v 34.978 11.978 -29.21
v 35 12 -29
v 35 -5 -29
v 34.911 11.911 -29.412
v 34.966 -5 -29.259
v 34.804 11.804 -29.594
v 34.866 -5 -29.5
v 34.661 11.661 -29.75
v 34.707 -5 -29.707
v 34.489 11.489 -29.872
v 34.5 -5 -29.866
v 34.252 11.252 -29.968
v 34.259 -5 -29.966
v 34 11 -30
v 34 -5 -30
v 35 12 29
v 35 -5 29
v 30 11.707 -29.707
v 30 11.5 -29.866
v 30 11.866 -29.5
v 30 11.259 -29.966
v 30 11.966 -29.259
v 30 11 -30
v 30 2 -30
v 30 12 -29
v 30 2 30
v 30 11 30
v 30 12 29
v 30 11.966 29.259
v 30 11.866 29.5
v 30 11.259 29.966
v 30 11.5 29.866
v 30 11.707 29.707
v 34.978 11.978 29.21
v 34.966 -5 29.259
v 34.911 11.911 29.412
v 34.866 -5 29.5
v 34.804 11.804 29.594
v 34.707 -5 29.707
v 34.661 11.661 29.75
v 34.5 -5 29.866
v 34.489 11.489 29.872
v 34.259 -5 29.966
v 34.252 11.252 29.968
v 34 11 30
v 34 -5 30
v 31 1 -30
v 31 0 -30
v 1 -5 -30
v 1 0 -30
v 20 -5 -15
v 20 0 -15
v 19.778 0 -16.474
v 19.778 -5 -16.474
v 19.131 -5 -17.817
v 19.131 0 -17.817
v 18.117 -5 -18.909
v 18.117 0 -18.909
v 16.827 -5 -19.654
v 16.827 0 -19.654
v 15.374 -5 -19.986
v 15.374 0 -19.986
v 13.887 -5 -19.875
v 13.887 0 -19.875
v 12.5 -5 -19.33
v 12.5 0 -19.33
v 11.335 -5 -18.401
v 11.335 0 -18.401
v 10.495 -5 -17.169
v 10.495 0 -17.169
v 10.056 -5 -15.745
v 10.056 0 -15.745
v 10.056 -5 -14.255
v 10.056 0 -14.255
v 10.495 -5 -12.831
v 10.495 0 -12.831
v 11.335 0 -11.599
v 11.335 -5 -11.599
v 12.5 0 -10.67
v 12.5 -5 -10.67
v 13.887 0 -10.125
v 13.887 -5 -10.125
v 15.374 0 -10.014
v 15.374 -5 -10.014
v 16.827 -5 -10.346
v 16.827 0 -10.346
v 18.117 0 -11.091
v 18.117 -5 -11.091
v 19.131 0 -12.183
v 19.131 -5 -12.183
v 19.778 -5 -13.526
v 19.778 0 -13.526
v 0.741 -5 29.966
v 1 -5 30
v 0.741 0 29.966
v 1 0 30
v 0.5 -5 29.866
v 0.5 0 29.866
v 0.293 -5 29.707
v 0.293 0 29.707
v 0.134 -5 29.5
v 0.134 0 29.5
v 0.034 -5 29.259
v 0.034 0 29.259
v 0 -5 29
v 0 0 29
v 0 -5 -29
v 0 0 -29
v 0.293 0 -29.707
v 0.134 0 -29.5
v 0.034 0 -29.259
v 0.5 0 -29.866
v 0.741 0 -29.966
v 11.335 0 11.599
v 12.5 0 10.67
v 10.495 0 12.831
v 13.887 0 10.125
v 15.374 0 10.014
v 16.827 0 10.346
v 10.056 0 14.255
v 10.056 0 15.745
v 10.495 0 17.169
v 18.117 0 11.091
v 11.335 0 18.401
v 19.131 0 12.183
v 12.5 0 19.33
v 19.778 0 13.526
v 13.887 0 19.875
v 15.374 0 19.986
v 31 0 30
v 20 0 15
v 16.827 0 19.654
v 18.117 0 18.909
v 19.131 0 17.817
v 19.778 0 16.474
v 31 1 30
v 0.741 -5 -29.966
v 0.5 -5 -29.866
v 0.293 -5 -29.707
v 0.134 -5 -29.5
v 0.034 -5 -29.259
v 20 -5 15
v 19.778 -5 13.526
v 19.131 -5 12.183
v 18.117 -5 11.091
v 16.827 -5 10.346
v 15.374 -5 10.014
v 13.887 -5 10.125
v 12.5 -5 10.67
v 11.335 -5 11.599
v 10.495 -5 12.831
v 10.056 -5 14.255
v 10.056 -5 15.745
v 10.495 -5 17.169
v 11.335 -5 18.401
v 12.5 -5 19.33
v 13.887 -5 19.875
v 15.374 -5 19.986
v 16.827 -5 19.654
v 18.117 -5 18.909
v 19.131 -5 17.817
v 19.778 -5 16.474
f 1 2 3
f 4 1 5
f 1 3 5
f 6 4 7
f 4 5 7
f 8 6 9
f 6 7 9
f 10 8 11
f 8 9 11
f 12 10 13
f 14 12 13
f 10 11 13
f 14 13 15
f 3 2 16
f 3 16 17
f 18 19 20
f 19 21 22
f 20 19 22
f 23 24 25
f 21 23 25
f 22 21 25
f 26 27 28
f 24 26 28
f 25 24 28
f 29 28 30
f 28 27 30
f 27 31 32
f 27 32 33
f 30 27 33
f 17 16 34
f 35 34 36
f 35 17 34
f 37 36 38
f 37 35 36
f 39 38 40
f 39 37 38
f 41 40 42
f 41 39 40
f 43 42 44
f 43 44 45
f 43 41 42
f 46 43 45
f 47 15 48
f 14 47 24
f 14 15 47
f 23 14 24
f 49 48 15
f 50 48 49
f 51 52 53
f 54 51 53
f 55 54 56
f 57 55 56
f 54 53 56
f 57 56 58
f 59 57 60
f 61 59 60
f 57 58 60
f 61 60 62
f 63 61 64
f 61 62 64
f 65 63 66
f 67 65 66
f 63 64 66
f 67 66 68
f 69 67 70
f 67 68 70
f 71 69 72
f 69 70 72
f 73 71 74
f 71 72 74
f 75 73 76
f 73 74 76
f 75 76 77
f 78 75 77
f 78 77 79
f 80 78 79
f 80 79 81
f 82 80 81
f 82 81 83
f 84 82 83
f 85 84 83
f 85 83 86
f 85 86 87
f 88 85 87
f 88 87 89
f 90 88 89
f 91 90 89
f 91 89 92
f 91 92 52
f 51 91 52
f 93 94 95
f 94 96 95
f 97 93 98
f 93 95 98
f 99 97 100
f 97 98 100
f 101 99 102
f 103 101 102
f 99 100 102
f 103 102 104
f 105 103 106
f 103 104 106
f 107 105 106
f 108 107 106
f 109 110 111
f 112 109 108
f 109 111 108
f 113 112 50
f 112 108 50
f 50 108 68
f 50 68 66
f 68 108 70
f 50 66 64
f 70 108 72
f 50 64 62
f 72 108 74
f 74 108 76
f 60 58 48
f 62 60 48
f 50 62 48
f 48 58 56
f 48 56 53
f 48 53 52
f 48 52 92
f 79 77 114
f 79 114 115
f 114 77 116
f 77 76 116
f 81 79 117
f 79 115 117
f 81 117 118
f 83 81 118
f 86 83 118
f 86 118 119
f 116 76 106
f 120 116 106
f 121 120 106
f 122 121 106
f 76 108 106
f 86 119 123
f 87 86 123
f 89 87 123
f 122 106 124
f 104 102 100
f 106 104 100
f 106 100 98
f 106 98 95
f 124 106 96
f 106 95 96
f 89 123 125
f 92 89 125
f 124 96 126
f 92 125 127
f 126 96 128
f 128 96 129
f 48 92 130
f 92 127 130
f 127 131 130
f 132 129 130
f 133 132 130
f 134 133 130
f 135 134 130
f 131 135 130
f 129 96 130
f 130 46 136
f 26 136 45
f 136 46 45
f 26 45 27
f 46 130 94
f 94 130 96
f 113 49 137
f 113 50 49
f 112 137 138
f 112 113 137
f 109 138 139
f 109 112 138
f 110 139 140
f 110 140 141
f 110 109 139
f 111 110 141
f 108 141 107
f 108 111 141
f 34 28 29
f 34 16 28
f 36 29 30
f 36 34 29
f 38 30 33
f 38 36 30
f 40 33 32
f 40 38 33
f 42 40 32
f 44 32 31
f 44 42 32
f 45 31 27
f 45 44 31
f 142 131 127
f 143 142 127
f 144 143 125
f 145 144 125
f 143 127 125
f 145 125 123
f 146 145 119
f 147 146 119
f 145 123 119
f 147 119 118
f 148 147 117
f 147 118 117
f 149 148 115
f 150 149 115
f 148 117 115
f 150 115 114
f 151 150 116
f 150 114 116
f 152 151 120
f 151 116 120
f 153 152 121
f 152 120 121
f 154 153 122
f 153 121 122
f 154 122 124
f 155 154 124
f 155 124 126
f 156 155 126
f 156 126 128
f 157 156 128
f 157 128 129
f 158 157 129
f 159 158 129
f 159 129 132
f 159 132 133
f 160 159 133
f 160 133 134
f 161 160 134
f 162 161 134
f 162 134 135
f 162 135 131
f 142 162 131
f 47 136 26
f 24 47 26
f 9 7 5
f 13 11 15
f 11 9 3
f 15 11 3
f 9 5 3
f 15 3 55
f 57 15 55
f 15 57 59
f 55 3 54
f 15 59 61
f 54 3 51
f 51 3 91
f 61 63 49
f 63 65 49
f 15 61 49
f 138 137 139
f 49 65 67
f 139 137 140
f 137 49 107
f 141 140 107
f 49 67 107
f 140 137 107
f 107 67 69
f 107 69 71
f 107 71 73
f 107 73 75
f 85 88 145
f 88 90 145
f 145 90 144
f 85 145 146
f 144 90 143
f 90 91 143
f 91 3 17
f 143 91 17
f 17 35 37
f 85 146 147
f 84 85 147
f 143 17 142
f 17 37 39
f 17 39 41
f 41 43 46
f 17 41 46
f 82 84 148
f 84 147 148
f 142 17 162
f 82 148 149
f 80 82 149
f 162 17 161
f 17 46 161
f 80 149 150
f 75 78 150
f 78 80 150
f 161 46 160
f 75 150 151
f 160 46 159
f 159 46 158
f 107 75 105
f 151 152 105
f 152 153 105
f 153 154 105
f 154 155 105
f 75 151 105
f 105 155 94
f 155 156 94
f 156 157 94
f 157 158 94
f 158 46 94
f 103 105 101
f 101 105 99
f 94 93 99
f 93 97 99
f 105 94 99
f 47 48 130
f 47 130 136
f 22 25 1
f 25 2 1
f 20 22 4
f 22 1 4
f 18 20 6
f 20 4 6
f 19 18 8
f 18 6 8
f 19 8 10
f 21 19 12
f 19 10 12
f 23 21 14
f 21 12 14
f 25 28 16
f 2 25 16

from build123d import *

# Parameters (mm, degrees)
EXTRUDE_THIN1_DEPTH  = 30
M8_CLEARANCE_HOLE1_D = 10
CUT_EXTRUDE1_REACH   = 72.491
FILLET1_R            = 1


with BuildPart() as part:
    # Sketch1 → Extrude-Thin1 (new, symmetric)
    with BuildSketch(Plane.XY):
        Polygon((0, 0), (30, 0), (30, 12), (35, 12), (35, -5), (0, -5), align=None)
    extrude(amount=EXTRUDE_THIN1_DEPTH, both=True)

    # M8 Clearance Hole1 (through all)
    with Locations(Plane(origin=(0, -5, 0), x_dir=(-1, 0, 0), z_dir=(0, -1, 0))):
        with Locations((-15, 15), (-15, -15)):
            Hole(M8_CLEARANCE_HOLE1_D / 2)

    # Sketch5 → Cut-Extrude1 (cut, up to next)
    with BuildSketch(Plane(origin=(0, 0, -30), x_dir=(-1, 0, 0), z_dir=(0, 0, -1)), mode=Mode.PRIVATE) as cut_extrude1_sk1:
        Polygon((-30, 0), (-31, 0), (-31, 1), (-30, 2), align=None)
    cut_extrude1_tool1 = extrude(cut_extrude1_sk1.sketch, amount=-CUT_EXTRUDE1_REACH, mode=Mode.PRIVATE) & part.part
    add(cut_extrude1_tool1.solids().sort_by_distance((30.444444, 0.777778, -30))[0], mode=Mode.SUBTRACT)

    # Fillet1
    fillet1_edges = [part.edges().sort_by_distance(p)[0] for p in [
        (0, -2.5, 30),
        (35, 3.5, 30),
        (0, -2.5, -30),
        (32.5, 12, -30),
        (35, 3.5, -30),
        (32.5, 12, 30),
    ]]
    fillet(fillet1_edges, radius=FILLET1_R)


solid = part.part
